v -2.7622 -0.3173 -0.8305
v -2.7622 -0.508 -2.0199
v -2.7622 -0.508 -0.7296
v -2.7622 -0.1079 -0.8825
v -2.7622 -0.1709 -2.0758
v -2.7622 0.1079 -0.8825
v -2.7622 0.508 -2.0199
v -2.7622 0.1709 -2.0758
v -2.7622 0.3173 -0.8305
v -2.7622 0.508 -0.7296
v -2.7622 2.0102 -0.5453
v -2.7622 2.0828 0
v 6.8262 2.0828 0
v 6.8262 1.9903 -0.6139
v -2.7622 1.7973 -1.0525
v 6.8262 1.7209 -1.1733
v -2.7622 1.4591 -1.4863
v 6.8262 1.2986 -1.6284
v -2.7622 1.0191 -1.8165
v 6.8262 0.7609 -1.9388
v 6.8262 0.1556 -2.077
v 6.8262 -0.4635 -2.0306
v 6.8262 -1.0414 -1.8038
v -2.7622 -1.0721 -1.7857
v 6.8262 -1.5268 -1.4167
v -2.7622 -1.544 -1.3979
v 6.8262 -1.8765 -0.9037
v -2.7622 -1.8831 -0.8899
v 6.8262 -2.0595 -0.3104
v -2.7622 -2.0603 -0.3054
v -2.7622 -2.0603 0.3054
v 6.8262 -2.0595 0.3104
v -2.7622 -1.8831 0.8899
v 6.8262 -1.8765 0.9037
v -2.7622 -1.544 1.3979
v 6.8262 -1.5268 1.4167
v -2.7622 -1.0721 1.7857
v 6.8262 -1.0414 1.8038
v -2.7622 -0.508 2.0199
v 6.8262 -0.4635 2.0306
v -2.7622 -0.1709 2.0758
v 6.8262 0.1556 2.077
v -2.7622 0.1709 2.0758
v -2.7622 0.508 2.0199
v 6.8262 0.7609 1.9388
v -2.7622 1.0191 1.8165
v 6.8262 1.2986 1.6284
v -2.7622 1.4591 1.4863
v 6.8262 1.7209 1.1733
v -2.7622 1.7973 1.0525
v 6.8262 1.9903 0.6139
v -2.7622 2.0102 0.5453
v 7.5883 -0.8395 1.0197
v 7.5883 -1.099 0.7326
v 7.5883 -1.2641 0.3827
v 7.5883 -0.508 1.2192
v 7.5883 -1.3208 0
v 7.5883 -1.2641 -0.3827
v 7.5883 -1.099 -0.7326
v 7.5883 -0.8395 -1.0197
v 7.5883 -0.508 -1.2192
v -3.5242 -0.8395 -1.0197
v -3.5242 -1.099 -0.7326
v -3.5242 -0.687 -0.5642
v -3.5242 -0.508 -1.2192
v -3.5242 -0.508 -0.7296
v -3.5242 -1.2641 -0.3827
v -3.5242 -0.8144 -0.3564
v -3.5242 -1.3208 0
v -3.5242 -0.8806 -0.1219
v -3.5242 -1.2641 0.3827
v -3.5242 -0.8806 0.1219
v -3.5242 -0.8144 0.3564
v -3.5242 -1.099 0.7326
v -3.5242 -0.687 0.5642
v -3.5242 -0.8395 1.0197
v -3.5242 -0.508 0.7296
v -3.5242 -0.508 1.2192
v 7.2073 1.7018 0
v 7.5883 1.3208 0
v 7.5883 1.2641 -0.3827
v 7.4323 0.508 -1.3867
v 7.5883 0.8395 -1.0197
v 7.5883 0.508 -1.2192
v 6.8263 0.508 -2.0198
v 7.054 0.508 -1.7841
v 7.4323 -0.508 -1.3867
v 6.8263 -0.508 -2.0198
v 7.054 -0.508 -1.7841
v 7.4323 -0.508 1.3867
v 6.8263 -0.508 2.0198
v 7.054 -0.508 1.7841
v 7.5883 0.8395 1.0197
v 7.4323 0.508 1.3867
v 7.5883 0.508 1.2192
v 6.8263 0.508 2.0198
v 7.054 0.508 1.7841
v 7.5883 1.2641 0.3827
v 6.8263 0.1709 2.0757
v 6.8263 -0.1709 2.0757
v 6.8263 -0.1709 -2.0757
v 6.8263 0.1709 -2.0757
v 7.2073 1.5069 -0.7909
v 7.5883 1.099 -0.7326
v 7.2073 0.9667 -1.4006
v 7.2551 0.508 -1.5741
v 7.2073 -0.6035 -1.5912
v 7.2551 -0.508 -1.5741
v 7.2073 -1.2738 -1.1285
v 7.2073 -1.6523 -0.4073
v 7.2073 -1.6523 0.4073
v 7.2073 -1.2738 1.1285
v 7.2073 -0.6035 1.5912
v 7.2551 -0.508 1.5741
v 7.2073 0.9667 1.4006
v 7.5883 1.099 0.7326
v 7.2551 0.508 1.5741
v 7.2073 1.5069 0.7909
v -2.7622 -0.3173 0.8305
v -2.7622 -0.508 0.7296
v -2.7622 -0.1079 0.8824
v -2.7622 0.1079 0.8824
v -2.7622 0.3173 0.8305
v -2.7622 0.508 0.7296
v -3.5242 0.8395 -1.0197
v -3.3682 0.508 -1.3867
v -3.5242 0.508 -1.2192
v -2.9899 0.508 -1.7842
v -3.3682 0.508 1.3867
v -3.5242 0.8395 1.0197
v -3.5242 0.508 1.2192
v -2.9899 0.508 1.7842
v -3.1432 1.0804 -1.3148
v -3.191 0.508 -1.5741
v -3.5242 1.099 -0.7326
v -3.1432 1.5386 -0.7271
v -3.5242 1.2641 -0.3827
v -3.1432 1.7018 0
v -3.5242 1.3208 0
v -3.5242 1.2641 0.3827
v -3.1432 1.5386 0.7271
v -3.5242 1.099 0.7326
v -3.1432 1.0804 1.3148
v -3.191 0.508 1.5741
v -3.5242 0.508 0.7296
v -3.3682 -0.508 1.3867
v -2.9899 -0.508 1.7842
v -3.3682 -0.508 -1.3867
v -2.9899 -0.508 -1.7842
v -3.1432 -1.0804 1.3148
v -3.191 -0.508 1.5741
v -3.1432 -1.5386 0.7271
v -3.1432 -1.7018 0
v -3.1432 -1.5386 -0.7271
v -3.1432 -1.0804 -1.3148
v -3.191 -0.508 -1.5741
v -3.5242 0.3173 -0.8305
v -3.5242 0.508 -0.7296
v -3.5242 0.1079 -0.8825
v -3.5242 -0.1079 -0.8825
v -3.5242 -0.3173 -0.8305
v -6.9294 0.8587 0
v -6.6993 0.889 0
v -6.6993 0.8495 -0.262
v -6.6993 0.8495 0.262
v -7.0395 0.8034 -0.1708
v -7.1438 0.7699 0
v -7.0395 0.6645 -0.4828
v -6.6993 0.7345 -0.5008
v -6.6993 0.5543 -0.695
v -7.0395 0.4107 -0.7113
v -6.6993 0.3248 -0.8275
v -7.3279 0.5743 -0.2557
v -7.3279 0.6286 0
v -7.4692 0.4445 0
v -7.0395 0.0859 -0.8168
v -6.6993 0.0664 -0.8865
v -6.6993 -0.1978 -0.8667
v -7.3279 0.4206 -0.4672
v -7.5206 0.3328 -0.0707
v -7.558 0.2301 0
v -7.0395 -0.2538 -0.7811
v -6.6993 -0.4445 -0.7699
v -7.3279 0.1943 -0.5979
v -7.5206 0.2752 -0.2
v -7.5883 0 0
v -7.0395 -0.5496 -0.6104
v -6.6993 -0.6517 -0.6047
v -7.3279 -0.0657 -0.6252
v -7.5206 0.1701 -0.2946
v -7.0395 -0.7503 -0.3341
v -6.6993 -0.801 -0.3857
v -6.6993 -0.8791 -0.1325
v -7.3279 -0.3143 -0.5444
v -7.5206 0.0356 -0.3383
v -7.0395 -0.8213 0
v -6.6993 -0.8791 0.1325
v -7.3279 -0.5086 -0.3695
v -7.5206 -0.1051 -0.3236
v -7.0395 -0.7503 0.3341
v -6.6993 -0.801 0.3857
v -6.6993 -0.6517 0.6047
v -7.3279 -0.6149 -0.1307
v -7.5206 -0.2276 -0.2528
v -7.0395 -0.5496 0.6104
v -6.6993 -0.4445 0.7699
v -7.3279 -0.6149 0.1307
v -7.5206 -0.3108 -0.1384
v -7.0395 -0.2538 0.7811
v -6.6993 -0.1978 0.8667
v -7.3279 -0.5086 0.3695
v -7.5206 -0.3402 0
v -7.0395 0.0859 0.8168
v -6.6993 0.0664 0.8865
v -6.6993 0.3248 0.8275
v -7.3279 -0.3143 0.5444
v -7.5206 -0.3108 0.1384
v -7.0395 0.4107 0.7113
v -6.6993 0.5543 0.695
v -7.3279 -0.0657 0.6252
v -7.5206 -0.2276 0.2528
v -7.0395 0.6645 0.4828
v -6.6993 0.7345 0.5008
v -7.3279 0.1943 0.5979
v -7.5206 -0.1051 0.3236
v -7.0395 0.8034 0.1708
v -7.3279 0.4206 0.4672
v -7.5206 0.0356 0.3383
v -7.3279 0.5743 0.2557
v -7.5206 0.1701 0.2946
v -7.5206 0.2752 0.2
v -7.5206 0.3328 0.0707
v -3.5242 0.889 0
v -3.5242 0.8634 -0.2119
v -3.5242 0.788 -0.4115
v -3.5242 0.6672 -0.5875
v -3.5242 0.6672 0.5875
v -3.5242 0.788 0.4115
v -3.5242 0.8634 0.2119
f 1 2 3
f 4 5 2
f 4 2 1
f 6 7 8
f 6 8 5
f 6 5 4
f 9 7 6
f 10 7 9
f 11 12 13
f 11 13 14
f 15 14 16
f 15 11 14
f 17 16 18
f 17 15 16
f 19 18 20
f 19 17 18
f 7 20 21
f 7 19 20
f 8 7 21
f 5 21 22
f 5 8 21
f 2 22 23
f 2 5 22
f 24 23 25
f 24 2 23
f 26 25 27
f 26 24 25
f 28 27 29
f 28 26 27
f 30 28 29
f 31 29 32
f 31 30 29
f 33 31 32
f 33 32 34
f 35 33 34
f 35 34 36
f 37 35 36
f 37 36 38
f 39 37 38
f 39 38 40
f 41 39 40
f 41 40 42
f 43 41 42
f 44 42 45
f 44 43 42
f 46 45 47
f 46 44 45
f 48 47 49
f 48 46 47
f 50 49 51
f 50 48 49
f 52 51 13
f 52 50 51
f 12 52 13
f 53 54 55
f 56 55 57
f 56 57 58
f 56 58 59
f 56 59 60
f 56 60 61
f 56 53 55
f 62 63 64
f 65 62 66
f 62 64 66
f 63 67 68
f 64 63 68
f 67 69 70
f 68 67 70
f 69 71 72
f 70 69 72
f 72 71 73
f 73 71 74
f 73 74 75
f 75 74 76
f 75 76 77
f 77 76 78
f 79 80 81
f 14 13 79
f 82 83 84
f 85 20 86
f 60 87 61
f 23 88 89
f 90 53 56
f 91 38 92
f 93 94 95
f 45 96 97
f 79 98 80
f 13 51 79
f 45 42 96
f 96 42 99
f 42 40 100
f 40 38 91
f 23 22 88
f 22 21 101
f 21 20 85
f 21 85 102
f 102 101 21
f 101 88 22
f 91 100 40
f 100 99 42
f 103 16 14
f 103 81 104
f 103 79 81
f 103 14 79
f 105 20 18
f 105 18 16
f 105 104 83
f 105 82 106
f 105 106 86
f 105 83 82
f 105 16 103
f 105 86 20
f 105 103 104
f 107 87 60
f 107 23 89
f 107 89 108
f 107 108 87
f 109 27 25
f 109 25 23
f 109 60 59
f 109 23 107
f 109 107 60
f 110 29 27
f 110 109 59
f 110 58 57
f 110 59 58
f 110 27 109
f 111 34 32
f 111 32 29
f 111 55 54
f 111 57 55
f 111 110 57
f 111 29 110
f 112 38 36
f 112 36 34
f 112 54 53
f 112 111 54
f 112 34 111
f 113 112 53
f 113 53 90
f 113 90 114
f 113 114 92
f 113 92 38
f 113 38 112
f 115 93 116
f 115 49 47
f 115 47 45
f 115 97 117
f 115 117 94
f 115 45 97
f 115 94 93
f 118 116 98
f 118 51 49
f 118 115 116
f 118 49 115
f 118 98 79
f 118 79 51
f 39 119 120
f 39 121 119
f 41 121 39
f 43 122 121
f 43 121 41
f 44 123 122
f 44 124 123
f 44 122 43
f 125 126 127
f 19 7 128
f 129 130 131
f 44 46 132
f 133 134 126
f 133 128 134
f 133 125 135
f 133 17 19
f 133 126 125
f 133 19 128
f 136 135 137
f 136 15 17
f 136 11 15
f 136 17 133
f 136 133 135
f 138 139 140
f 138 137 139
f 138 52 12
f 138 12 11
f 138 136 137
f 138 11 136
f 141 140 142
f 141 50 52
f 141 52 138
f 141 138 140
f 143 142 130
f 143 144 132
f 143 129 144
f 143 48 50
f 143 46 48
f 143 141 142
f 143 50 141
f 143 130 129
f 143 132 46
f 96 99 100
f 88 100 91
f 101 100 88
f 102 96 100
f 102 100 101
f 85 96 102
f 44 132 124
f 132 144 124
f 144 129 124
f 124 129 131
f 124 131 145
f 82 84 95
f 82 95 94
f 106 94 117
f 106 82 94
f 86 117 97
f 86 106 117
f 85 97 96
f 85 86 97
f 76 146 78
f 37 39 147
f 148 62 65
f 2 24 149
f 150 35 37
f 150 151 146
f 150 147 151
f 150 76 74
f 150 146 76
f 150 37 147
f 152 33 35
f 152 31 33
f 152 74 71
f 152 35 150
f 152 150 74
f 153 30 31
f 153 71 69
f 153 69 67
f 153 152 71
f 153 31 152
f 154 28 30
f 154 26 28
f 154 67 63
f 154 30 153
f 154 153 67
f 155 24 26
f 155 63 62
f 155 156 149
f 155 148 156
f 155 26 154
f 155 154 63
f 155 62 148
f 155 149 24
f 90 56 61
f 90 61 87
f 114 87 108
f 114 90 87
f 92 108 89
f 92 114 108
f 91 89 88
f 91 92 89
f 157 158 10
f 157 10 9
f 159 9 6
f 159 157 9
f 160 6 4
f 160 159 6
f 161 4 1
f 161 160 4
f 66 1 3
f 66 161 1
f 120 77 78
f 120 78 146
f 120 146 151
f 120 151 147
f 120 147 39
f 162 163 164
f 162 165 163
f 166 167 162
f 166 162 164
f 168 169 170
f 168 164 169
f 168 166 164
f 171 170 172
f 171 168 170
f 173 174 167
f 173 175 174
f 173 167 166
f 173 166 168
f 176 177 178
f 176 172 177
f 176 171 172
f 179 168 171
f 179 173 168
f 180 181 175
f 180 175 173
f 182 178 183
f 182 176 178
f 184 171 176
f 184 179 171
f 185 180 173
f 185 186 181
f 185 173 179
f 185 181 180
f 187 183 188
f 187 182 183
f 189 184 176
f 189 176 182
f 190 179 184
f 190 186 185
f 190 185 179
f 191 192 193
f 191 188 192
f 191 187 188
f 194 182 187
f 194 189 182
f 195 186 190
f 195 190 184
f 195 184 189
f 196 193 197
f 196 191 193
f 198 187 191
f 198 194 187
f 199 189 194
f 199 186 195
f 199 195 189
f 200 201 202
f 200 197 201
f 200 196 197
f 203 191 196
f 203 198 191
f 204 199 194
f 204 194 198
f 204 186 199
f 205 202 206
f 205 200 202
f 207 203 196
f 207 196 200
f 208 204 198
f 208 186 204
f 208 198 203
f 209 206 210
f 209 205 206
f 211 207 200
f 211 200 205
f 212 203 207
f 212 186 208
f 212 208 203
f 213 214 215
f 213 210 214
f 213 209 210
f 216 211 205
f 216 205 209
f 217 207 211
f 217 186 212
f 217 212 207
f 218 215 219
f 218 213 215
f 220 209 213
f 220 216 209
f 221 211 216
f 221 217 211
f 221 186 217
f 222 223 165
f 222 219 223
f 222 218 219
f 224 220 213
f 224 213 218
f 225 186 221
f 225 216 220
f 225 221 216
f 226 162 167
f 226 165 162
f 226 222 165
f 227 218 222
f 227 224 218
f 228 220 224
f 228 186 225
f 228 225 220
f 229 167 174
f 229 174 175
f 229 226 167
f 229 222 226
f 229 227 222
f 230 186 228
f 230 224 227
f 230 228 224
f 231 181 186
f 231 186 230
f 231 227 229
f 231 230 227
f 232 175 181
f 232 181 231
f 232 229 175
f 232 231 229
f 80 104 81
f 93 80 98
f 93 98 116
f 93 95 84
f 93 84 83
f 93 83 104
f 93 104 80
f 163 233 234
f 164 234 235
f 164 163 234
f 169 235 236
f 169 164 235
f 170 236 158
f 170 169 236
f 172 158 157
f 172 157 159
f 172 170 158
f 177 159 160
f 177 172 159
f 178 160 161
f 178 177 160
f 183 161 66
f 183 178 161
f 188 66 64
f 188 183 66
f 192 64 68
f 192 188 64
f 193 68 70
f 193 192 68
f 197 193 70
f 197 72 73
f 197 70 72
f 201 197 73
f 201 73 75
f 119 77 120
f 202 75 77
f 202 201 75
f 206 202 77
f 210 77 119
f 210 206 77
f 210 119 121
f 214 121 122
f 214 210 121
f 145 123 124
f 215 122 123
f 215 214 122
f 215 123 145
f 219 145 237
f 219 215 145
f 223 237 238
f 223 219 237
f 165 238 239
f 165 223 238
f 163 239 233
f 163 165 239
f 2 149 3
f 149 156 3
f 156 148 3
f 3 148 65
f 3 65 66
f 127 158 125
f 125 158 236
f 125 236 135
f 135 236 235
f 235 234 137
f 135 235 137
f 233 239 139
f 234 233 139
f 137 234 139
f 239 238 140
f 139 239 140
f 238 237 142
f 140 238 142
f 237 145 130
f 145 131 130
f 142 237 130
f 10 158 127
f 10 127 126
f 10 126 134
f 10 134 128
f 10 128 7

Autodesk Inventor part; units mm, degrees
ref_plane "YZ Plane" through (0, 0, 0) normal (1, 0, 0) x (0, 1, 0)
ref_plane "XZ Plane" through (0, 0, 0) normal (0, 1, 0) x (-1, 0, 0)
ref_plane "XY Plane" through (0, 0, 0) normal (0, 0, 1) x (1, 0, 0)
sketch "Sketch1" plane through (0, 0, 0) normal (0, 0, 1) x (1, 0, 0)
  line L0 (-7.5883, 0) -> (7.5883, 0)
  line L1 (7.5883, 0) -> (7.5883, 1.3208)
  line L2 (7.5883, 1.3208) -> (6.8262, 2.0828)
  line L3 (6.8262, 2.0828) -> (-2.7622, 2.0828)
  line L4 (-2.7622, 2.0828) -> (-3.5242, 1.3208)
  line L5 (-3.5242, 1.3208) -> (-3.5242, 0.889)
  line L6 (-3.5242, 0.889) -> (-6.6993, 0.889)
  arc A0 (-6.6993, 0.889) -> (-7.5883, 0) centre (-6.6993, 0) ccw
  point P0 (0, 0)
  point P1 (0, 0)
  dimension "d0" = 4.1656
  dimension "d1" = 11.1125
  dimension "d2" = 1.778
  dimension "d3" = 0.762
  dimension "d4" = 4.064
revolve "Revolution1" add sketch "Sketch1" angle 360 about axis through (-7.5883, 0, 0) along (1, 0, 0)
sketch "Sketch2" plane through (7.5883, 0, 0) normal (1, 0, 0) x (0, 0, -1)
  circle A0 centre (0, 0) radius 2.0828 projected
  circle A1 centre (0, 0) radius 1.3208 projected
  line L0 (-2.0828, 0.508) -> (2.0828, 0.508)
  line L1 (2.0828, 0.508) -> (2.0828, -0.508)
  line L2 (2.0828, -0.508) -> (-2.0828, -0.508)
  line L3 (-2.0828, -0.508) -> (-2.0828, 0.508)
  point P0 (0, 0)
  point P1 (-2.0828, 0)
  dimension "d6" = 1.016
extrude "Extrusion1" cut sketch "Sketch2" against normal blind 0.762 contours A0 L2 A1 L0 | L1 L2 A0 | A0 L0 L1 | L0 A1 L2 A0 | A0 L3 L0 | A1 L2 L0 | L2 L3 A0
thread "Thread1" size "8-36 UNF" class "2A" standard "ANSI Unified Screw Threads" full length
sketch "Sketch3" plane through (-3.5242, 0, 0) normal (-1, 0, 0) x (0, 0, 1)
  arc A0 (2.0199, -0.508) -> (2.0199, 0.508) centre (0, 0) ccw projected
  line L0 (-2.0199, -0.508) -> (2.0199, -0.508) projected
  arc A1 (-2.0199, 0.508) -> (-2.0199, -0.508) centre (0, 0) ccw projected
  line L1 (2.0199, 0.508) -> (-2.0199, 0.508) projected
  circle A2 centre (0, 0) radius 0.889 projected
  circle A3 centre (0, 0) radius 1.3208 projected
  arc A4 (-0.7296, 0.508) -> (-0.7296, -0.508) centre (0, 0) ccw
  arc A5 (0.7296, -0.508) -> (0.7296, 0.508) centre (0, 0) ccw
  point P0 (0, 0)
extrude "Extrusion2" cut sketch "Sketch3" against normal blind 0.762 contours L0 A3 L1 A0 | L0 A2 L1 A3 | A3 L1 A2 L0 | L0 A1 L1 A3
properties part number "Spring_Separation" material "Stainless Steel"
